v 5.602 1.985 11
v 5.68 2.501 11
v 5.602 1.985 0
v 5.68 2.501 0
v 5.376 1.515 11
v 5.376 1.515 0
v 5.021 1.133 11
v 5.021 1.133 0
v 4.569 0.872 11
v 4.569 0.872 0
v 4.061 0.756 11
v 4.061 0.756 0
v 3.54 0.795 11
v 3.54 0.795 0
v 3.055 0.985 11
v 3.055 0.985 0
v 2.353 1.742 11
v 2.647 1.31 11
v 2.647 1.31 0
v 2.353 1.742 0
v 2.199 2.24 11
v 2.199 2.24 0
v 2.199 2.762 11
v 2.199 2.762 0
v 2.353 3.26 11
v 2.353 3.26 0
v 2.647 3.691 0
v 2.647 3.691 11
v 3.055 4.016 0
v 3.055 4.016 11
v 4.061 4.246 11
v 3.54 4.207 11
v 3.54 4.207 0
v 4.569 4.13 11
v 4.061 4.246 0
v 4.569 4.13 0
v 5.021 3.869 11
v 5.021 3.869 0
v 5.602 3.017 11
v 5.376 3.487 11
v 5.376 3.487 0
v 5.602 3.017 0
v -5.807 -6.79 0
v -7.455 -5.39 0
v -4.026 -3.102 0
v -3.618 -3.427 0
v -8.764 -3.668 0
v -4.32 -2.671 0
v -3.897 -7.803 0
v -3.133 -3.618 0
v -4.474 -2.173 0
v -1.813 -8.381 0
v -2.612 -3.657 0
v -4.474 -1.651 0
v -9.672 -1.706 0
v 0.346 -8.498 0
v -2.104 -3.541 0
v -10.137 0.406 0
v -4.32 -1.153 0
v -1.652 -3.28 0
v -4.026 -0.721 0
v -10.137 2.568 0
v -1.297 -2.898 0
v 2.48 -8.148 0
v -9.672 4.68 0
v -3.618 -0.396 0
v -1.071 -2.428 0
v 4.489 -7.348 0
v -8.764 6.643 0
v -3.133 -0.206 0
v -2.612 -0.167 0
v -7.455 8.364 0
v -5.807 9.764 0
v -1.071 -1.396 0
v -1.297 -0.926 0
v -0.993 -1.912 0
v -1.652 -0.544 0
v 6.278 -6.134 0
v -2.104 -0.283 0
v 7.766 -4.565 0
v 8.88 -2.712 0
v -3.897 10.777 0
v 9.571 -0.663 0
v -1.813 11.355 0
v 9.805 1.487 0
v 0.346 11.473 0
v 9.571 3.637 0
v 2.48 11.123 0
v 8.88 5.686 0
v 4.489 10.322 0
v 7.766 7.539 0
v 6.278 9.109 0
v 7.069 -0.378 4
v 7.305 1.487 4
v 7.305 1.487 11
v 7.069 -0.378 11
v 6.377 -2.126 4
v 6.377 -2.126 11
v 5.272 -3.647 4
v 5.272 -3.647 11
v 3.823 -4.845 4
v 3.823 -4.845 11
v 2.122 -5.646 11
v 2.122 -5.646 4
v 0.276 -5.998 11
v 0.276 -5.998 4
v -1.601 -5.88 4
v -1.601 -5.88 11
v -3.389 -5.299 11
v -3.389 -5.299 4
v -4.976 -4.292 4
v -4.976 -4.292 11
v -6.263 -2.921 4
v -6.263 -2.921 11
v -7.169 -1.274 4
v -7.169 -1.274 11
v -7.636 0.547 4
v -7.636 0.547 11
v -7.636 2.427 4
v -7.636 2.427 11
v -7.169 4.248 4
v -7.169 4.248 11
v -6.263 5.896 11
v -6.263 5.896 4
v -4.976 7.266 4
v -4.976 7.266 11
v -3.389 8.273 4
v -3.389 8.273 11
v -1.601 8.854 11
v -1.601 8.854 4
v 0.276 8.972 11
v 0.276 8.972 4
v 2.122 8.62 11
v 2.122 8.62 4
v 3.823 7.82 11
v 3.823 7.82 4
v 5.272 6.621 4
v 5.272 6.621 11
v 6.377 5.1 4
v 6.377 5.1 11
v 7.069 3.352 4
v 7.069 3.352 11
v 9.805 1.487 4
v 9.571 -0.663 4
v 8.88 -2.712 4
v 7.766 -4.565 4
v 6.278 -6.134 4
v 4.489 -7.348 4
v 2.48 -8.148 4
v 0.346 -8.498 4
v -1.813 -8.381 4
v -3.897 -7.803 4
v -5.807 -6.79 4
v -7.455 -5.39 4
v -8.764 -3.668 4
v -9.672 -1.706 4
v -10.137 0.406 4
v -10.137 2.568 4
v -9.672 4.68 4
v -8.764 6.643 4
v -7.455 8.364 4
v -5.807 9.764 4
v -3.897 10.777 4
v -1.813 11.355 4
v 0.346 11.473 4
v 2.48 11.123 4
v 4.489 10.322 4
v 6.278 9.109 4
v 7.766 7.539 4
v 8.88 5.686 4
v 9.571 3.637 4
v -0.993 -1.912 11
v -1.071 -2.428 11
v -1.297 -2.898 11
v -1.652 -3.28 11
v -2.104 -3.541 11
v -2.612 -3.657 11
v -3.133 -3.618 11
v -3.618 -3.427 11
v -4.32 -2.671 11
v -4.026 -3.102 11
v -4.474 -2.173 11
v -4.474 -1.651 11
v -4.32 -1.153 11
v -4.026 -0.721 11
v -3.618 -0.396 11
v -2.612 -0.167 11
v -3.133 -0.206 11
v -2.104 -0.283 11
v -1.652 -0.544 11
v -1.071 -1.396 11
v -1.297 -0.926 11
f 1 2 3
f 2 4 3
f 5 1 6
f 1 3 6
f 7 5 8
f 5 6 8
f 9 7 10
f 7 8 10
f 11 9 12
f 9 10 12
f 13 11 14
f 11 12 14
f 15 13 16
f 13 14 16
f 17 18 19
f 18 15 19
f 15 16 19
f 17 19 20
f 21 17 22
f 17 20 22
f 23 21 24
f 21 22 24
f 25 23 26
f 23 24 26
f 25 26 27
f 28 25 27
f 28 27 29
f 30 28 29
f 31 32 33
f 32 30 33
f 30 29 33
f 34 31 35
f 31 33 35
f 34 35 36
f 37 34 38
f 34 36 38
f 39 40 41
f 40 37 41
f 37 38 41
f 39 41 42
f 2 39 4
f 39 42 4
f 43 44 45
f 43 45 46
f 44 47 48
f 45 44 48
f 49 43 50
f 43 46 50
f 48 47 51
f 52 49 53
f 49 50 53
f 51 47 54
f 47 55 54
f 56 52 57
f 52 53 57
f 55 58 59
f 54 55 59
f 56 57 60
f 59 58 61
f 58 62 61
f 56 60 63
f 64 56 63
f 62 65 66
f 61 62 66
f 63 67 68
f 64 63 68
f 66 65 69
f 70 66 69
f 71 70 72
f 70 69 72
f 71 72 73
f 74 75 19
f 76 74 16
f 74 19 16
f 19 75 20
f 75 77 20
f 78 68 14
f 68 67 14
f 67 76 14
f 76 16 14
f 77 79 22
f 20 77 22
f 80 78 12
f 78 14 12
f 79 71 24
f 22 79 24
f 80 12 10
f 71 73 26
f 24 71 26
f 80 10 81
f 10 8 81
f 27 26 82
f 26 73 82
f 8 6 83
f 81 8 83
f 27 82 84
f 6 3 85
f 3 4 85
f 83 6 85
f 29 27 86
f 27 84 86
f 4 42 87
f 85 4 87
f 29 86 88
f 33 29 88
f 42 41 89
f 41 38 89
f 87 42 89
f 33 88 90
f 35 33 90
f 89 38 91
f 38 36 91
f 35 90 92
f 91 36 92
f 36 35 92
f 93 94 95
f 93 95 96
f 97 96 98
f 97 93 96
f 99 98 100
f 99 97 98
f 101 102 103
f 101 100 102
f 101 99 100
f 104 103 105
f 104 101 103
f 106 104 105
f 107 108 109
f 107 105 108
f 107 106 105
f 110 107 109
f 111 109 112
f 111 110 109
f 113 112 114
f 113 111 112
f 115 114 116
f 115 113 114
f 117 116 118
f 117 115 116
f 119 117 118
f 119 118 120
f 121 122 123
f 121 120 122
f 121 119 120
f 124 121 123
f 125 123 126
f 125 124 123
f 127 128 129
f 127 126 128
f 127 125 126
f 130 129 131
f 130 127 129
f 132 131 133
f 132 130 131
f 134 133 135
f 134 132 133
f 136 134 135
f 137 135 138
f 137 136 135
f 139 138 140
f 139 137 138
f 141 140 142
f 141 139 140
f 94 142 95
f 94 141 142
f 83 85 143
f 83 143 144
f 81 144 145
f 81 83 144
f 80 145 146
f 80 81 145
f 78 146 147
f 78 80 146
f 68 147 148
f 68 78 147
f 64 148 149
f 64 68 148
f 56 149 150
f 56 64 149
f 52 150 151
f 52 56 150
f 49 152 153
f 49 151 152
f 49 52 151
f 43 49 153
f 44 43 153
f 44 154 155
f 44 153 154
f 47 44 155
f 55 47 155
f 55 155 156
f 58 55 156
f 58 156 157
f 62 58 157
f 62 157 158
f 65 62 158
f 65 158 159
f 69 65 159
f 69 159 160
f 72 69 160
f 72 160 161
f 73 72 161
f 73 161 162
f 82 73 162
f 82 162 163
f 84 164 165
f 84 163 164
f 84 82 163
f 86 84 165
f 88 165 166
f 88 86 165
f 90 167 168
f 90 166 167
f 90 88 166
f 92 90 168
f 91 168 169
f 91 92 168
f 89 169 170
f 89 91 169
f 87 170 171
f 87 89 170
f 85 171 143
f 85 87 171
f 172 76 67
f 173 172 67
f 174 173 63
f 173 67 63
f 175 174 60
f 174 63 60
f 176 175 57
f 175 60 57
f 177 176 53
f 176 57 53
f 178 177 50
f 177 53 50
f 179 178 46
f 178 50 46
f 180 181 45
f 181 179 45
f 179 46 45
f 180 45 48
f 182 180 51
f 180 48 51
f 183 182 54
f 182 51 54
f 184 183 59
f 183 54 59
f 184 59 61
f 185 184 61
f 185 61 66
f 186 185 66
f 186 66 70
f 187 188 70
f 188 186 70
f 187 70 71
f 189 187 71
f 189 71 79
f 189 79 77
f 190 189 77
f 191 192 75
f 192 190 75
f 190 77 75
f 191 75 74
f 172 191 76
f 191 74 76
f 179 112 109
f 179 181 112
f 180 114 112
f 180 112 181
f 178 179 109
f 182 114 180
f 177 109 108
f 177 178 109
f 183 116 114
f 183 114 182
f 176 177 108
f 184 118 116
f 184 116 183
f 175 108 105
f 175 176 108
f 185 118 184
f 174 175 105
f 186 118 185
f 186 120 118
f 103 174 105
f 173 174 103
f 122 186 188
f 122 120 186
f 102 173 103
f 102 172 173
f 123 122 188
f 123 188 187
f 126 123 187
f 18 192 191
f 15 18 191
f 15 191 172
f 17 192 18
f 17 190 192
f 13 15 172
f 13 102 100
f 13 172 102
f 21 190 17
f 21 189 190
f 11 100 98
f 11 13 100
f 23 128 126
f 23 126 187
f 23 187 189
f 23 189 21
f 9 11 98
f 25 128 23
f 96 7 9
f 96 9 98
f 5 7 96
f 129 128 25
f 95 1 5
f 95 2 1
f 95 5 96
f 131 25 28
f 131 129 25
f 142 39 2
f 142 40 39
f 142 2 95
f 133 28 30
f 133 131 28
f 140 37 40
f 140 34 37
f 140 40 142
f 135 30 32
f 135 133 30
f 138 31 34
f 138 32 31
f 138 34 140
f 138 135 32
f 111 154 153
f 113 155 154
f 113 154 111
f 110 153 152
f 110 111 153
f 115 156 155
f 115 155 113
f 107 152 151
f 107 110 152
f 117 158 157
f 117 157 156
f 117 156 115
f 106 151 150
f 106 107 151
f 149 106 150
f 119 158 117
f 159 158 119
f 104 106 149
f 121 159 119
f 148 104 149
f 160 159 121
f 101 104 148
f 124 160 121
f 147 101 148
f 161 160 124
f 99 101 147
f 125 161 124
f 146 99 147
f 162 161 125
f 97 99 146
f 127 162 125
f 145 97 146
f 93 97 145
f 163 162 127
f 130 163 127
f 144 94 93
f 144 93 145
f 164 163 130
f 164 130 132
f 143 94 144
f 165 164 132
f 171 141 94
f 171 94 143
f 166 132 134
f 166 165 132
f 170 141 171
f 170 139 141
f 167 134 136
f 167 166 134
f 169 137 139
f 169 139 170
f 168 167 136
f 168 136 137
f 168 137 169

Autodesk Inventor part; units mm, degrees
ref_plane "YZ Plane" through (0, 0, 0) normal (1, 0, 0) x (0, 1, 0)
ref_plane "XZ Plane" through (0, 0, 0) normal (0, 1, 0) x (-1, 0, 0)
ref_plane "XY Plane" through (0, 0, 0) normal (0, 0, 1) x (1, 0, 0)
sketch "Sketch3" plane through (0, 0, 0) normal (0, 0, 1) x (1, 0, 0)
  circle A0 centre (-0.1954, 1.4872) radius 10
  circle A1 centre (0.5933, 0.2945) radius 7.5 construction
  circle A2 centre (-2.7432, -1.9118) radius 1.75 construction
  circle A3 centre (-2.7432, -1.9118) radius 1.75
  circle A4 centre (3.9298, 2.5008) radius 1.75
  circle A5 centre (3.9298, 2.5008) radius 1.75 construction
  line L0 (3.9298, 2.5008) -> (-2.7432, -1.9118) construction
  line L1 (0.5933, 0.2945) -> (-1.1822, 2.9794) construction
  point P0 (0, 0)
  dimension "d1" = 1.5
  dimension "d2" = 20
  dimension "d9" = 8
extrude "Extrusion1" add sketch "Sketch3" along normal blind 4
sketch "Sketch4" plane through (-0.1954, 1.4872, 4) normal (0, 0, 1) x (1, 0, 0)
  circle A0 centre (0, 0) radius 10 construction
  circle A1 centre (4.1252, 1.0136) radius 1.75 construction
  circle A2 centre (-2.5478, -3.399) radius 1.75 construction
  circle A3 centre (0, 0) radius 7.5
  circle A4 centre (4.1252, 1.0136) radius 1.75
  circle A5 centre (-2.5478, -3.399) radius 1.75
  point P0 (0.1954, -1.4872)
  dimension "d6" = 15
extrude "Extrusion2" add sketch "Sketch4" along normal blind 7
properties part number "Shaft-2"
